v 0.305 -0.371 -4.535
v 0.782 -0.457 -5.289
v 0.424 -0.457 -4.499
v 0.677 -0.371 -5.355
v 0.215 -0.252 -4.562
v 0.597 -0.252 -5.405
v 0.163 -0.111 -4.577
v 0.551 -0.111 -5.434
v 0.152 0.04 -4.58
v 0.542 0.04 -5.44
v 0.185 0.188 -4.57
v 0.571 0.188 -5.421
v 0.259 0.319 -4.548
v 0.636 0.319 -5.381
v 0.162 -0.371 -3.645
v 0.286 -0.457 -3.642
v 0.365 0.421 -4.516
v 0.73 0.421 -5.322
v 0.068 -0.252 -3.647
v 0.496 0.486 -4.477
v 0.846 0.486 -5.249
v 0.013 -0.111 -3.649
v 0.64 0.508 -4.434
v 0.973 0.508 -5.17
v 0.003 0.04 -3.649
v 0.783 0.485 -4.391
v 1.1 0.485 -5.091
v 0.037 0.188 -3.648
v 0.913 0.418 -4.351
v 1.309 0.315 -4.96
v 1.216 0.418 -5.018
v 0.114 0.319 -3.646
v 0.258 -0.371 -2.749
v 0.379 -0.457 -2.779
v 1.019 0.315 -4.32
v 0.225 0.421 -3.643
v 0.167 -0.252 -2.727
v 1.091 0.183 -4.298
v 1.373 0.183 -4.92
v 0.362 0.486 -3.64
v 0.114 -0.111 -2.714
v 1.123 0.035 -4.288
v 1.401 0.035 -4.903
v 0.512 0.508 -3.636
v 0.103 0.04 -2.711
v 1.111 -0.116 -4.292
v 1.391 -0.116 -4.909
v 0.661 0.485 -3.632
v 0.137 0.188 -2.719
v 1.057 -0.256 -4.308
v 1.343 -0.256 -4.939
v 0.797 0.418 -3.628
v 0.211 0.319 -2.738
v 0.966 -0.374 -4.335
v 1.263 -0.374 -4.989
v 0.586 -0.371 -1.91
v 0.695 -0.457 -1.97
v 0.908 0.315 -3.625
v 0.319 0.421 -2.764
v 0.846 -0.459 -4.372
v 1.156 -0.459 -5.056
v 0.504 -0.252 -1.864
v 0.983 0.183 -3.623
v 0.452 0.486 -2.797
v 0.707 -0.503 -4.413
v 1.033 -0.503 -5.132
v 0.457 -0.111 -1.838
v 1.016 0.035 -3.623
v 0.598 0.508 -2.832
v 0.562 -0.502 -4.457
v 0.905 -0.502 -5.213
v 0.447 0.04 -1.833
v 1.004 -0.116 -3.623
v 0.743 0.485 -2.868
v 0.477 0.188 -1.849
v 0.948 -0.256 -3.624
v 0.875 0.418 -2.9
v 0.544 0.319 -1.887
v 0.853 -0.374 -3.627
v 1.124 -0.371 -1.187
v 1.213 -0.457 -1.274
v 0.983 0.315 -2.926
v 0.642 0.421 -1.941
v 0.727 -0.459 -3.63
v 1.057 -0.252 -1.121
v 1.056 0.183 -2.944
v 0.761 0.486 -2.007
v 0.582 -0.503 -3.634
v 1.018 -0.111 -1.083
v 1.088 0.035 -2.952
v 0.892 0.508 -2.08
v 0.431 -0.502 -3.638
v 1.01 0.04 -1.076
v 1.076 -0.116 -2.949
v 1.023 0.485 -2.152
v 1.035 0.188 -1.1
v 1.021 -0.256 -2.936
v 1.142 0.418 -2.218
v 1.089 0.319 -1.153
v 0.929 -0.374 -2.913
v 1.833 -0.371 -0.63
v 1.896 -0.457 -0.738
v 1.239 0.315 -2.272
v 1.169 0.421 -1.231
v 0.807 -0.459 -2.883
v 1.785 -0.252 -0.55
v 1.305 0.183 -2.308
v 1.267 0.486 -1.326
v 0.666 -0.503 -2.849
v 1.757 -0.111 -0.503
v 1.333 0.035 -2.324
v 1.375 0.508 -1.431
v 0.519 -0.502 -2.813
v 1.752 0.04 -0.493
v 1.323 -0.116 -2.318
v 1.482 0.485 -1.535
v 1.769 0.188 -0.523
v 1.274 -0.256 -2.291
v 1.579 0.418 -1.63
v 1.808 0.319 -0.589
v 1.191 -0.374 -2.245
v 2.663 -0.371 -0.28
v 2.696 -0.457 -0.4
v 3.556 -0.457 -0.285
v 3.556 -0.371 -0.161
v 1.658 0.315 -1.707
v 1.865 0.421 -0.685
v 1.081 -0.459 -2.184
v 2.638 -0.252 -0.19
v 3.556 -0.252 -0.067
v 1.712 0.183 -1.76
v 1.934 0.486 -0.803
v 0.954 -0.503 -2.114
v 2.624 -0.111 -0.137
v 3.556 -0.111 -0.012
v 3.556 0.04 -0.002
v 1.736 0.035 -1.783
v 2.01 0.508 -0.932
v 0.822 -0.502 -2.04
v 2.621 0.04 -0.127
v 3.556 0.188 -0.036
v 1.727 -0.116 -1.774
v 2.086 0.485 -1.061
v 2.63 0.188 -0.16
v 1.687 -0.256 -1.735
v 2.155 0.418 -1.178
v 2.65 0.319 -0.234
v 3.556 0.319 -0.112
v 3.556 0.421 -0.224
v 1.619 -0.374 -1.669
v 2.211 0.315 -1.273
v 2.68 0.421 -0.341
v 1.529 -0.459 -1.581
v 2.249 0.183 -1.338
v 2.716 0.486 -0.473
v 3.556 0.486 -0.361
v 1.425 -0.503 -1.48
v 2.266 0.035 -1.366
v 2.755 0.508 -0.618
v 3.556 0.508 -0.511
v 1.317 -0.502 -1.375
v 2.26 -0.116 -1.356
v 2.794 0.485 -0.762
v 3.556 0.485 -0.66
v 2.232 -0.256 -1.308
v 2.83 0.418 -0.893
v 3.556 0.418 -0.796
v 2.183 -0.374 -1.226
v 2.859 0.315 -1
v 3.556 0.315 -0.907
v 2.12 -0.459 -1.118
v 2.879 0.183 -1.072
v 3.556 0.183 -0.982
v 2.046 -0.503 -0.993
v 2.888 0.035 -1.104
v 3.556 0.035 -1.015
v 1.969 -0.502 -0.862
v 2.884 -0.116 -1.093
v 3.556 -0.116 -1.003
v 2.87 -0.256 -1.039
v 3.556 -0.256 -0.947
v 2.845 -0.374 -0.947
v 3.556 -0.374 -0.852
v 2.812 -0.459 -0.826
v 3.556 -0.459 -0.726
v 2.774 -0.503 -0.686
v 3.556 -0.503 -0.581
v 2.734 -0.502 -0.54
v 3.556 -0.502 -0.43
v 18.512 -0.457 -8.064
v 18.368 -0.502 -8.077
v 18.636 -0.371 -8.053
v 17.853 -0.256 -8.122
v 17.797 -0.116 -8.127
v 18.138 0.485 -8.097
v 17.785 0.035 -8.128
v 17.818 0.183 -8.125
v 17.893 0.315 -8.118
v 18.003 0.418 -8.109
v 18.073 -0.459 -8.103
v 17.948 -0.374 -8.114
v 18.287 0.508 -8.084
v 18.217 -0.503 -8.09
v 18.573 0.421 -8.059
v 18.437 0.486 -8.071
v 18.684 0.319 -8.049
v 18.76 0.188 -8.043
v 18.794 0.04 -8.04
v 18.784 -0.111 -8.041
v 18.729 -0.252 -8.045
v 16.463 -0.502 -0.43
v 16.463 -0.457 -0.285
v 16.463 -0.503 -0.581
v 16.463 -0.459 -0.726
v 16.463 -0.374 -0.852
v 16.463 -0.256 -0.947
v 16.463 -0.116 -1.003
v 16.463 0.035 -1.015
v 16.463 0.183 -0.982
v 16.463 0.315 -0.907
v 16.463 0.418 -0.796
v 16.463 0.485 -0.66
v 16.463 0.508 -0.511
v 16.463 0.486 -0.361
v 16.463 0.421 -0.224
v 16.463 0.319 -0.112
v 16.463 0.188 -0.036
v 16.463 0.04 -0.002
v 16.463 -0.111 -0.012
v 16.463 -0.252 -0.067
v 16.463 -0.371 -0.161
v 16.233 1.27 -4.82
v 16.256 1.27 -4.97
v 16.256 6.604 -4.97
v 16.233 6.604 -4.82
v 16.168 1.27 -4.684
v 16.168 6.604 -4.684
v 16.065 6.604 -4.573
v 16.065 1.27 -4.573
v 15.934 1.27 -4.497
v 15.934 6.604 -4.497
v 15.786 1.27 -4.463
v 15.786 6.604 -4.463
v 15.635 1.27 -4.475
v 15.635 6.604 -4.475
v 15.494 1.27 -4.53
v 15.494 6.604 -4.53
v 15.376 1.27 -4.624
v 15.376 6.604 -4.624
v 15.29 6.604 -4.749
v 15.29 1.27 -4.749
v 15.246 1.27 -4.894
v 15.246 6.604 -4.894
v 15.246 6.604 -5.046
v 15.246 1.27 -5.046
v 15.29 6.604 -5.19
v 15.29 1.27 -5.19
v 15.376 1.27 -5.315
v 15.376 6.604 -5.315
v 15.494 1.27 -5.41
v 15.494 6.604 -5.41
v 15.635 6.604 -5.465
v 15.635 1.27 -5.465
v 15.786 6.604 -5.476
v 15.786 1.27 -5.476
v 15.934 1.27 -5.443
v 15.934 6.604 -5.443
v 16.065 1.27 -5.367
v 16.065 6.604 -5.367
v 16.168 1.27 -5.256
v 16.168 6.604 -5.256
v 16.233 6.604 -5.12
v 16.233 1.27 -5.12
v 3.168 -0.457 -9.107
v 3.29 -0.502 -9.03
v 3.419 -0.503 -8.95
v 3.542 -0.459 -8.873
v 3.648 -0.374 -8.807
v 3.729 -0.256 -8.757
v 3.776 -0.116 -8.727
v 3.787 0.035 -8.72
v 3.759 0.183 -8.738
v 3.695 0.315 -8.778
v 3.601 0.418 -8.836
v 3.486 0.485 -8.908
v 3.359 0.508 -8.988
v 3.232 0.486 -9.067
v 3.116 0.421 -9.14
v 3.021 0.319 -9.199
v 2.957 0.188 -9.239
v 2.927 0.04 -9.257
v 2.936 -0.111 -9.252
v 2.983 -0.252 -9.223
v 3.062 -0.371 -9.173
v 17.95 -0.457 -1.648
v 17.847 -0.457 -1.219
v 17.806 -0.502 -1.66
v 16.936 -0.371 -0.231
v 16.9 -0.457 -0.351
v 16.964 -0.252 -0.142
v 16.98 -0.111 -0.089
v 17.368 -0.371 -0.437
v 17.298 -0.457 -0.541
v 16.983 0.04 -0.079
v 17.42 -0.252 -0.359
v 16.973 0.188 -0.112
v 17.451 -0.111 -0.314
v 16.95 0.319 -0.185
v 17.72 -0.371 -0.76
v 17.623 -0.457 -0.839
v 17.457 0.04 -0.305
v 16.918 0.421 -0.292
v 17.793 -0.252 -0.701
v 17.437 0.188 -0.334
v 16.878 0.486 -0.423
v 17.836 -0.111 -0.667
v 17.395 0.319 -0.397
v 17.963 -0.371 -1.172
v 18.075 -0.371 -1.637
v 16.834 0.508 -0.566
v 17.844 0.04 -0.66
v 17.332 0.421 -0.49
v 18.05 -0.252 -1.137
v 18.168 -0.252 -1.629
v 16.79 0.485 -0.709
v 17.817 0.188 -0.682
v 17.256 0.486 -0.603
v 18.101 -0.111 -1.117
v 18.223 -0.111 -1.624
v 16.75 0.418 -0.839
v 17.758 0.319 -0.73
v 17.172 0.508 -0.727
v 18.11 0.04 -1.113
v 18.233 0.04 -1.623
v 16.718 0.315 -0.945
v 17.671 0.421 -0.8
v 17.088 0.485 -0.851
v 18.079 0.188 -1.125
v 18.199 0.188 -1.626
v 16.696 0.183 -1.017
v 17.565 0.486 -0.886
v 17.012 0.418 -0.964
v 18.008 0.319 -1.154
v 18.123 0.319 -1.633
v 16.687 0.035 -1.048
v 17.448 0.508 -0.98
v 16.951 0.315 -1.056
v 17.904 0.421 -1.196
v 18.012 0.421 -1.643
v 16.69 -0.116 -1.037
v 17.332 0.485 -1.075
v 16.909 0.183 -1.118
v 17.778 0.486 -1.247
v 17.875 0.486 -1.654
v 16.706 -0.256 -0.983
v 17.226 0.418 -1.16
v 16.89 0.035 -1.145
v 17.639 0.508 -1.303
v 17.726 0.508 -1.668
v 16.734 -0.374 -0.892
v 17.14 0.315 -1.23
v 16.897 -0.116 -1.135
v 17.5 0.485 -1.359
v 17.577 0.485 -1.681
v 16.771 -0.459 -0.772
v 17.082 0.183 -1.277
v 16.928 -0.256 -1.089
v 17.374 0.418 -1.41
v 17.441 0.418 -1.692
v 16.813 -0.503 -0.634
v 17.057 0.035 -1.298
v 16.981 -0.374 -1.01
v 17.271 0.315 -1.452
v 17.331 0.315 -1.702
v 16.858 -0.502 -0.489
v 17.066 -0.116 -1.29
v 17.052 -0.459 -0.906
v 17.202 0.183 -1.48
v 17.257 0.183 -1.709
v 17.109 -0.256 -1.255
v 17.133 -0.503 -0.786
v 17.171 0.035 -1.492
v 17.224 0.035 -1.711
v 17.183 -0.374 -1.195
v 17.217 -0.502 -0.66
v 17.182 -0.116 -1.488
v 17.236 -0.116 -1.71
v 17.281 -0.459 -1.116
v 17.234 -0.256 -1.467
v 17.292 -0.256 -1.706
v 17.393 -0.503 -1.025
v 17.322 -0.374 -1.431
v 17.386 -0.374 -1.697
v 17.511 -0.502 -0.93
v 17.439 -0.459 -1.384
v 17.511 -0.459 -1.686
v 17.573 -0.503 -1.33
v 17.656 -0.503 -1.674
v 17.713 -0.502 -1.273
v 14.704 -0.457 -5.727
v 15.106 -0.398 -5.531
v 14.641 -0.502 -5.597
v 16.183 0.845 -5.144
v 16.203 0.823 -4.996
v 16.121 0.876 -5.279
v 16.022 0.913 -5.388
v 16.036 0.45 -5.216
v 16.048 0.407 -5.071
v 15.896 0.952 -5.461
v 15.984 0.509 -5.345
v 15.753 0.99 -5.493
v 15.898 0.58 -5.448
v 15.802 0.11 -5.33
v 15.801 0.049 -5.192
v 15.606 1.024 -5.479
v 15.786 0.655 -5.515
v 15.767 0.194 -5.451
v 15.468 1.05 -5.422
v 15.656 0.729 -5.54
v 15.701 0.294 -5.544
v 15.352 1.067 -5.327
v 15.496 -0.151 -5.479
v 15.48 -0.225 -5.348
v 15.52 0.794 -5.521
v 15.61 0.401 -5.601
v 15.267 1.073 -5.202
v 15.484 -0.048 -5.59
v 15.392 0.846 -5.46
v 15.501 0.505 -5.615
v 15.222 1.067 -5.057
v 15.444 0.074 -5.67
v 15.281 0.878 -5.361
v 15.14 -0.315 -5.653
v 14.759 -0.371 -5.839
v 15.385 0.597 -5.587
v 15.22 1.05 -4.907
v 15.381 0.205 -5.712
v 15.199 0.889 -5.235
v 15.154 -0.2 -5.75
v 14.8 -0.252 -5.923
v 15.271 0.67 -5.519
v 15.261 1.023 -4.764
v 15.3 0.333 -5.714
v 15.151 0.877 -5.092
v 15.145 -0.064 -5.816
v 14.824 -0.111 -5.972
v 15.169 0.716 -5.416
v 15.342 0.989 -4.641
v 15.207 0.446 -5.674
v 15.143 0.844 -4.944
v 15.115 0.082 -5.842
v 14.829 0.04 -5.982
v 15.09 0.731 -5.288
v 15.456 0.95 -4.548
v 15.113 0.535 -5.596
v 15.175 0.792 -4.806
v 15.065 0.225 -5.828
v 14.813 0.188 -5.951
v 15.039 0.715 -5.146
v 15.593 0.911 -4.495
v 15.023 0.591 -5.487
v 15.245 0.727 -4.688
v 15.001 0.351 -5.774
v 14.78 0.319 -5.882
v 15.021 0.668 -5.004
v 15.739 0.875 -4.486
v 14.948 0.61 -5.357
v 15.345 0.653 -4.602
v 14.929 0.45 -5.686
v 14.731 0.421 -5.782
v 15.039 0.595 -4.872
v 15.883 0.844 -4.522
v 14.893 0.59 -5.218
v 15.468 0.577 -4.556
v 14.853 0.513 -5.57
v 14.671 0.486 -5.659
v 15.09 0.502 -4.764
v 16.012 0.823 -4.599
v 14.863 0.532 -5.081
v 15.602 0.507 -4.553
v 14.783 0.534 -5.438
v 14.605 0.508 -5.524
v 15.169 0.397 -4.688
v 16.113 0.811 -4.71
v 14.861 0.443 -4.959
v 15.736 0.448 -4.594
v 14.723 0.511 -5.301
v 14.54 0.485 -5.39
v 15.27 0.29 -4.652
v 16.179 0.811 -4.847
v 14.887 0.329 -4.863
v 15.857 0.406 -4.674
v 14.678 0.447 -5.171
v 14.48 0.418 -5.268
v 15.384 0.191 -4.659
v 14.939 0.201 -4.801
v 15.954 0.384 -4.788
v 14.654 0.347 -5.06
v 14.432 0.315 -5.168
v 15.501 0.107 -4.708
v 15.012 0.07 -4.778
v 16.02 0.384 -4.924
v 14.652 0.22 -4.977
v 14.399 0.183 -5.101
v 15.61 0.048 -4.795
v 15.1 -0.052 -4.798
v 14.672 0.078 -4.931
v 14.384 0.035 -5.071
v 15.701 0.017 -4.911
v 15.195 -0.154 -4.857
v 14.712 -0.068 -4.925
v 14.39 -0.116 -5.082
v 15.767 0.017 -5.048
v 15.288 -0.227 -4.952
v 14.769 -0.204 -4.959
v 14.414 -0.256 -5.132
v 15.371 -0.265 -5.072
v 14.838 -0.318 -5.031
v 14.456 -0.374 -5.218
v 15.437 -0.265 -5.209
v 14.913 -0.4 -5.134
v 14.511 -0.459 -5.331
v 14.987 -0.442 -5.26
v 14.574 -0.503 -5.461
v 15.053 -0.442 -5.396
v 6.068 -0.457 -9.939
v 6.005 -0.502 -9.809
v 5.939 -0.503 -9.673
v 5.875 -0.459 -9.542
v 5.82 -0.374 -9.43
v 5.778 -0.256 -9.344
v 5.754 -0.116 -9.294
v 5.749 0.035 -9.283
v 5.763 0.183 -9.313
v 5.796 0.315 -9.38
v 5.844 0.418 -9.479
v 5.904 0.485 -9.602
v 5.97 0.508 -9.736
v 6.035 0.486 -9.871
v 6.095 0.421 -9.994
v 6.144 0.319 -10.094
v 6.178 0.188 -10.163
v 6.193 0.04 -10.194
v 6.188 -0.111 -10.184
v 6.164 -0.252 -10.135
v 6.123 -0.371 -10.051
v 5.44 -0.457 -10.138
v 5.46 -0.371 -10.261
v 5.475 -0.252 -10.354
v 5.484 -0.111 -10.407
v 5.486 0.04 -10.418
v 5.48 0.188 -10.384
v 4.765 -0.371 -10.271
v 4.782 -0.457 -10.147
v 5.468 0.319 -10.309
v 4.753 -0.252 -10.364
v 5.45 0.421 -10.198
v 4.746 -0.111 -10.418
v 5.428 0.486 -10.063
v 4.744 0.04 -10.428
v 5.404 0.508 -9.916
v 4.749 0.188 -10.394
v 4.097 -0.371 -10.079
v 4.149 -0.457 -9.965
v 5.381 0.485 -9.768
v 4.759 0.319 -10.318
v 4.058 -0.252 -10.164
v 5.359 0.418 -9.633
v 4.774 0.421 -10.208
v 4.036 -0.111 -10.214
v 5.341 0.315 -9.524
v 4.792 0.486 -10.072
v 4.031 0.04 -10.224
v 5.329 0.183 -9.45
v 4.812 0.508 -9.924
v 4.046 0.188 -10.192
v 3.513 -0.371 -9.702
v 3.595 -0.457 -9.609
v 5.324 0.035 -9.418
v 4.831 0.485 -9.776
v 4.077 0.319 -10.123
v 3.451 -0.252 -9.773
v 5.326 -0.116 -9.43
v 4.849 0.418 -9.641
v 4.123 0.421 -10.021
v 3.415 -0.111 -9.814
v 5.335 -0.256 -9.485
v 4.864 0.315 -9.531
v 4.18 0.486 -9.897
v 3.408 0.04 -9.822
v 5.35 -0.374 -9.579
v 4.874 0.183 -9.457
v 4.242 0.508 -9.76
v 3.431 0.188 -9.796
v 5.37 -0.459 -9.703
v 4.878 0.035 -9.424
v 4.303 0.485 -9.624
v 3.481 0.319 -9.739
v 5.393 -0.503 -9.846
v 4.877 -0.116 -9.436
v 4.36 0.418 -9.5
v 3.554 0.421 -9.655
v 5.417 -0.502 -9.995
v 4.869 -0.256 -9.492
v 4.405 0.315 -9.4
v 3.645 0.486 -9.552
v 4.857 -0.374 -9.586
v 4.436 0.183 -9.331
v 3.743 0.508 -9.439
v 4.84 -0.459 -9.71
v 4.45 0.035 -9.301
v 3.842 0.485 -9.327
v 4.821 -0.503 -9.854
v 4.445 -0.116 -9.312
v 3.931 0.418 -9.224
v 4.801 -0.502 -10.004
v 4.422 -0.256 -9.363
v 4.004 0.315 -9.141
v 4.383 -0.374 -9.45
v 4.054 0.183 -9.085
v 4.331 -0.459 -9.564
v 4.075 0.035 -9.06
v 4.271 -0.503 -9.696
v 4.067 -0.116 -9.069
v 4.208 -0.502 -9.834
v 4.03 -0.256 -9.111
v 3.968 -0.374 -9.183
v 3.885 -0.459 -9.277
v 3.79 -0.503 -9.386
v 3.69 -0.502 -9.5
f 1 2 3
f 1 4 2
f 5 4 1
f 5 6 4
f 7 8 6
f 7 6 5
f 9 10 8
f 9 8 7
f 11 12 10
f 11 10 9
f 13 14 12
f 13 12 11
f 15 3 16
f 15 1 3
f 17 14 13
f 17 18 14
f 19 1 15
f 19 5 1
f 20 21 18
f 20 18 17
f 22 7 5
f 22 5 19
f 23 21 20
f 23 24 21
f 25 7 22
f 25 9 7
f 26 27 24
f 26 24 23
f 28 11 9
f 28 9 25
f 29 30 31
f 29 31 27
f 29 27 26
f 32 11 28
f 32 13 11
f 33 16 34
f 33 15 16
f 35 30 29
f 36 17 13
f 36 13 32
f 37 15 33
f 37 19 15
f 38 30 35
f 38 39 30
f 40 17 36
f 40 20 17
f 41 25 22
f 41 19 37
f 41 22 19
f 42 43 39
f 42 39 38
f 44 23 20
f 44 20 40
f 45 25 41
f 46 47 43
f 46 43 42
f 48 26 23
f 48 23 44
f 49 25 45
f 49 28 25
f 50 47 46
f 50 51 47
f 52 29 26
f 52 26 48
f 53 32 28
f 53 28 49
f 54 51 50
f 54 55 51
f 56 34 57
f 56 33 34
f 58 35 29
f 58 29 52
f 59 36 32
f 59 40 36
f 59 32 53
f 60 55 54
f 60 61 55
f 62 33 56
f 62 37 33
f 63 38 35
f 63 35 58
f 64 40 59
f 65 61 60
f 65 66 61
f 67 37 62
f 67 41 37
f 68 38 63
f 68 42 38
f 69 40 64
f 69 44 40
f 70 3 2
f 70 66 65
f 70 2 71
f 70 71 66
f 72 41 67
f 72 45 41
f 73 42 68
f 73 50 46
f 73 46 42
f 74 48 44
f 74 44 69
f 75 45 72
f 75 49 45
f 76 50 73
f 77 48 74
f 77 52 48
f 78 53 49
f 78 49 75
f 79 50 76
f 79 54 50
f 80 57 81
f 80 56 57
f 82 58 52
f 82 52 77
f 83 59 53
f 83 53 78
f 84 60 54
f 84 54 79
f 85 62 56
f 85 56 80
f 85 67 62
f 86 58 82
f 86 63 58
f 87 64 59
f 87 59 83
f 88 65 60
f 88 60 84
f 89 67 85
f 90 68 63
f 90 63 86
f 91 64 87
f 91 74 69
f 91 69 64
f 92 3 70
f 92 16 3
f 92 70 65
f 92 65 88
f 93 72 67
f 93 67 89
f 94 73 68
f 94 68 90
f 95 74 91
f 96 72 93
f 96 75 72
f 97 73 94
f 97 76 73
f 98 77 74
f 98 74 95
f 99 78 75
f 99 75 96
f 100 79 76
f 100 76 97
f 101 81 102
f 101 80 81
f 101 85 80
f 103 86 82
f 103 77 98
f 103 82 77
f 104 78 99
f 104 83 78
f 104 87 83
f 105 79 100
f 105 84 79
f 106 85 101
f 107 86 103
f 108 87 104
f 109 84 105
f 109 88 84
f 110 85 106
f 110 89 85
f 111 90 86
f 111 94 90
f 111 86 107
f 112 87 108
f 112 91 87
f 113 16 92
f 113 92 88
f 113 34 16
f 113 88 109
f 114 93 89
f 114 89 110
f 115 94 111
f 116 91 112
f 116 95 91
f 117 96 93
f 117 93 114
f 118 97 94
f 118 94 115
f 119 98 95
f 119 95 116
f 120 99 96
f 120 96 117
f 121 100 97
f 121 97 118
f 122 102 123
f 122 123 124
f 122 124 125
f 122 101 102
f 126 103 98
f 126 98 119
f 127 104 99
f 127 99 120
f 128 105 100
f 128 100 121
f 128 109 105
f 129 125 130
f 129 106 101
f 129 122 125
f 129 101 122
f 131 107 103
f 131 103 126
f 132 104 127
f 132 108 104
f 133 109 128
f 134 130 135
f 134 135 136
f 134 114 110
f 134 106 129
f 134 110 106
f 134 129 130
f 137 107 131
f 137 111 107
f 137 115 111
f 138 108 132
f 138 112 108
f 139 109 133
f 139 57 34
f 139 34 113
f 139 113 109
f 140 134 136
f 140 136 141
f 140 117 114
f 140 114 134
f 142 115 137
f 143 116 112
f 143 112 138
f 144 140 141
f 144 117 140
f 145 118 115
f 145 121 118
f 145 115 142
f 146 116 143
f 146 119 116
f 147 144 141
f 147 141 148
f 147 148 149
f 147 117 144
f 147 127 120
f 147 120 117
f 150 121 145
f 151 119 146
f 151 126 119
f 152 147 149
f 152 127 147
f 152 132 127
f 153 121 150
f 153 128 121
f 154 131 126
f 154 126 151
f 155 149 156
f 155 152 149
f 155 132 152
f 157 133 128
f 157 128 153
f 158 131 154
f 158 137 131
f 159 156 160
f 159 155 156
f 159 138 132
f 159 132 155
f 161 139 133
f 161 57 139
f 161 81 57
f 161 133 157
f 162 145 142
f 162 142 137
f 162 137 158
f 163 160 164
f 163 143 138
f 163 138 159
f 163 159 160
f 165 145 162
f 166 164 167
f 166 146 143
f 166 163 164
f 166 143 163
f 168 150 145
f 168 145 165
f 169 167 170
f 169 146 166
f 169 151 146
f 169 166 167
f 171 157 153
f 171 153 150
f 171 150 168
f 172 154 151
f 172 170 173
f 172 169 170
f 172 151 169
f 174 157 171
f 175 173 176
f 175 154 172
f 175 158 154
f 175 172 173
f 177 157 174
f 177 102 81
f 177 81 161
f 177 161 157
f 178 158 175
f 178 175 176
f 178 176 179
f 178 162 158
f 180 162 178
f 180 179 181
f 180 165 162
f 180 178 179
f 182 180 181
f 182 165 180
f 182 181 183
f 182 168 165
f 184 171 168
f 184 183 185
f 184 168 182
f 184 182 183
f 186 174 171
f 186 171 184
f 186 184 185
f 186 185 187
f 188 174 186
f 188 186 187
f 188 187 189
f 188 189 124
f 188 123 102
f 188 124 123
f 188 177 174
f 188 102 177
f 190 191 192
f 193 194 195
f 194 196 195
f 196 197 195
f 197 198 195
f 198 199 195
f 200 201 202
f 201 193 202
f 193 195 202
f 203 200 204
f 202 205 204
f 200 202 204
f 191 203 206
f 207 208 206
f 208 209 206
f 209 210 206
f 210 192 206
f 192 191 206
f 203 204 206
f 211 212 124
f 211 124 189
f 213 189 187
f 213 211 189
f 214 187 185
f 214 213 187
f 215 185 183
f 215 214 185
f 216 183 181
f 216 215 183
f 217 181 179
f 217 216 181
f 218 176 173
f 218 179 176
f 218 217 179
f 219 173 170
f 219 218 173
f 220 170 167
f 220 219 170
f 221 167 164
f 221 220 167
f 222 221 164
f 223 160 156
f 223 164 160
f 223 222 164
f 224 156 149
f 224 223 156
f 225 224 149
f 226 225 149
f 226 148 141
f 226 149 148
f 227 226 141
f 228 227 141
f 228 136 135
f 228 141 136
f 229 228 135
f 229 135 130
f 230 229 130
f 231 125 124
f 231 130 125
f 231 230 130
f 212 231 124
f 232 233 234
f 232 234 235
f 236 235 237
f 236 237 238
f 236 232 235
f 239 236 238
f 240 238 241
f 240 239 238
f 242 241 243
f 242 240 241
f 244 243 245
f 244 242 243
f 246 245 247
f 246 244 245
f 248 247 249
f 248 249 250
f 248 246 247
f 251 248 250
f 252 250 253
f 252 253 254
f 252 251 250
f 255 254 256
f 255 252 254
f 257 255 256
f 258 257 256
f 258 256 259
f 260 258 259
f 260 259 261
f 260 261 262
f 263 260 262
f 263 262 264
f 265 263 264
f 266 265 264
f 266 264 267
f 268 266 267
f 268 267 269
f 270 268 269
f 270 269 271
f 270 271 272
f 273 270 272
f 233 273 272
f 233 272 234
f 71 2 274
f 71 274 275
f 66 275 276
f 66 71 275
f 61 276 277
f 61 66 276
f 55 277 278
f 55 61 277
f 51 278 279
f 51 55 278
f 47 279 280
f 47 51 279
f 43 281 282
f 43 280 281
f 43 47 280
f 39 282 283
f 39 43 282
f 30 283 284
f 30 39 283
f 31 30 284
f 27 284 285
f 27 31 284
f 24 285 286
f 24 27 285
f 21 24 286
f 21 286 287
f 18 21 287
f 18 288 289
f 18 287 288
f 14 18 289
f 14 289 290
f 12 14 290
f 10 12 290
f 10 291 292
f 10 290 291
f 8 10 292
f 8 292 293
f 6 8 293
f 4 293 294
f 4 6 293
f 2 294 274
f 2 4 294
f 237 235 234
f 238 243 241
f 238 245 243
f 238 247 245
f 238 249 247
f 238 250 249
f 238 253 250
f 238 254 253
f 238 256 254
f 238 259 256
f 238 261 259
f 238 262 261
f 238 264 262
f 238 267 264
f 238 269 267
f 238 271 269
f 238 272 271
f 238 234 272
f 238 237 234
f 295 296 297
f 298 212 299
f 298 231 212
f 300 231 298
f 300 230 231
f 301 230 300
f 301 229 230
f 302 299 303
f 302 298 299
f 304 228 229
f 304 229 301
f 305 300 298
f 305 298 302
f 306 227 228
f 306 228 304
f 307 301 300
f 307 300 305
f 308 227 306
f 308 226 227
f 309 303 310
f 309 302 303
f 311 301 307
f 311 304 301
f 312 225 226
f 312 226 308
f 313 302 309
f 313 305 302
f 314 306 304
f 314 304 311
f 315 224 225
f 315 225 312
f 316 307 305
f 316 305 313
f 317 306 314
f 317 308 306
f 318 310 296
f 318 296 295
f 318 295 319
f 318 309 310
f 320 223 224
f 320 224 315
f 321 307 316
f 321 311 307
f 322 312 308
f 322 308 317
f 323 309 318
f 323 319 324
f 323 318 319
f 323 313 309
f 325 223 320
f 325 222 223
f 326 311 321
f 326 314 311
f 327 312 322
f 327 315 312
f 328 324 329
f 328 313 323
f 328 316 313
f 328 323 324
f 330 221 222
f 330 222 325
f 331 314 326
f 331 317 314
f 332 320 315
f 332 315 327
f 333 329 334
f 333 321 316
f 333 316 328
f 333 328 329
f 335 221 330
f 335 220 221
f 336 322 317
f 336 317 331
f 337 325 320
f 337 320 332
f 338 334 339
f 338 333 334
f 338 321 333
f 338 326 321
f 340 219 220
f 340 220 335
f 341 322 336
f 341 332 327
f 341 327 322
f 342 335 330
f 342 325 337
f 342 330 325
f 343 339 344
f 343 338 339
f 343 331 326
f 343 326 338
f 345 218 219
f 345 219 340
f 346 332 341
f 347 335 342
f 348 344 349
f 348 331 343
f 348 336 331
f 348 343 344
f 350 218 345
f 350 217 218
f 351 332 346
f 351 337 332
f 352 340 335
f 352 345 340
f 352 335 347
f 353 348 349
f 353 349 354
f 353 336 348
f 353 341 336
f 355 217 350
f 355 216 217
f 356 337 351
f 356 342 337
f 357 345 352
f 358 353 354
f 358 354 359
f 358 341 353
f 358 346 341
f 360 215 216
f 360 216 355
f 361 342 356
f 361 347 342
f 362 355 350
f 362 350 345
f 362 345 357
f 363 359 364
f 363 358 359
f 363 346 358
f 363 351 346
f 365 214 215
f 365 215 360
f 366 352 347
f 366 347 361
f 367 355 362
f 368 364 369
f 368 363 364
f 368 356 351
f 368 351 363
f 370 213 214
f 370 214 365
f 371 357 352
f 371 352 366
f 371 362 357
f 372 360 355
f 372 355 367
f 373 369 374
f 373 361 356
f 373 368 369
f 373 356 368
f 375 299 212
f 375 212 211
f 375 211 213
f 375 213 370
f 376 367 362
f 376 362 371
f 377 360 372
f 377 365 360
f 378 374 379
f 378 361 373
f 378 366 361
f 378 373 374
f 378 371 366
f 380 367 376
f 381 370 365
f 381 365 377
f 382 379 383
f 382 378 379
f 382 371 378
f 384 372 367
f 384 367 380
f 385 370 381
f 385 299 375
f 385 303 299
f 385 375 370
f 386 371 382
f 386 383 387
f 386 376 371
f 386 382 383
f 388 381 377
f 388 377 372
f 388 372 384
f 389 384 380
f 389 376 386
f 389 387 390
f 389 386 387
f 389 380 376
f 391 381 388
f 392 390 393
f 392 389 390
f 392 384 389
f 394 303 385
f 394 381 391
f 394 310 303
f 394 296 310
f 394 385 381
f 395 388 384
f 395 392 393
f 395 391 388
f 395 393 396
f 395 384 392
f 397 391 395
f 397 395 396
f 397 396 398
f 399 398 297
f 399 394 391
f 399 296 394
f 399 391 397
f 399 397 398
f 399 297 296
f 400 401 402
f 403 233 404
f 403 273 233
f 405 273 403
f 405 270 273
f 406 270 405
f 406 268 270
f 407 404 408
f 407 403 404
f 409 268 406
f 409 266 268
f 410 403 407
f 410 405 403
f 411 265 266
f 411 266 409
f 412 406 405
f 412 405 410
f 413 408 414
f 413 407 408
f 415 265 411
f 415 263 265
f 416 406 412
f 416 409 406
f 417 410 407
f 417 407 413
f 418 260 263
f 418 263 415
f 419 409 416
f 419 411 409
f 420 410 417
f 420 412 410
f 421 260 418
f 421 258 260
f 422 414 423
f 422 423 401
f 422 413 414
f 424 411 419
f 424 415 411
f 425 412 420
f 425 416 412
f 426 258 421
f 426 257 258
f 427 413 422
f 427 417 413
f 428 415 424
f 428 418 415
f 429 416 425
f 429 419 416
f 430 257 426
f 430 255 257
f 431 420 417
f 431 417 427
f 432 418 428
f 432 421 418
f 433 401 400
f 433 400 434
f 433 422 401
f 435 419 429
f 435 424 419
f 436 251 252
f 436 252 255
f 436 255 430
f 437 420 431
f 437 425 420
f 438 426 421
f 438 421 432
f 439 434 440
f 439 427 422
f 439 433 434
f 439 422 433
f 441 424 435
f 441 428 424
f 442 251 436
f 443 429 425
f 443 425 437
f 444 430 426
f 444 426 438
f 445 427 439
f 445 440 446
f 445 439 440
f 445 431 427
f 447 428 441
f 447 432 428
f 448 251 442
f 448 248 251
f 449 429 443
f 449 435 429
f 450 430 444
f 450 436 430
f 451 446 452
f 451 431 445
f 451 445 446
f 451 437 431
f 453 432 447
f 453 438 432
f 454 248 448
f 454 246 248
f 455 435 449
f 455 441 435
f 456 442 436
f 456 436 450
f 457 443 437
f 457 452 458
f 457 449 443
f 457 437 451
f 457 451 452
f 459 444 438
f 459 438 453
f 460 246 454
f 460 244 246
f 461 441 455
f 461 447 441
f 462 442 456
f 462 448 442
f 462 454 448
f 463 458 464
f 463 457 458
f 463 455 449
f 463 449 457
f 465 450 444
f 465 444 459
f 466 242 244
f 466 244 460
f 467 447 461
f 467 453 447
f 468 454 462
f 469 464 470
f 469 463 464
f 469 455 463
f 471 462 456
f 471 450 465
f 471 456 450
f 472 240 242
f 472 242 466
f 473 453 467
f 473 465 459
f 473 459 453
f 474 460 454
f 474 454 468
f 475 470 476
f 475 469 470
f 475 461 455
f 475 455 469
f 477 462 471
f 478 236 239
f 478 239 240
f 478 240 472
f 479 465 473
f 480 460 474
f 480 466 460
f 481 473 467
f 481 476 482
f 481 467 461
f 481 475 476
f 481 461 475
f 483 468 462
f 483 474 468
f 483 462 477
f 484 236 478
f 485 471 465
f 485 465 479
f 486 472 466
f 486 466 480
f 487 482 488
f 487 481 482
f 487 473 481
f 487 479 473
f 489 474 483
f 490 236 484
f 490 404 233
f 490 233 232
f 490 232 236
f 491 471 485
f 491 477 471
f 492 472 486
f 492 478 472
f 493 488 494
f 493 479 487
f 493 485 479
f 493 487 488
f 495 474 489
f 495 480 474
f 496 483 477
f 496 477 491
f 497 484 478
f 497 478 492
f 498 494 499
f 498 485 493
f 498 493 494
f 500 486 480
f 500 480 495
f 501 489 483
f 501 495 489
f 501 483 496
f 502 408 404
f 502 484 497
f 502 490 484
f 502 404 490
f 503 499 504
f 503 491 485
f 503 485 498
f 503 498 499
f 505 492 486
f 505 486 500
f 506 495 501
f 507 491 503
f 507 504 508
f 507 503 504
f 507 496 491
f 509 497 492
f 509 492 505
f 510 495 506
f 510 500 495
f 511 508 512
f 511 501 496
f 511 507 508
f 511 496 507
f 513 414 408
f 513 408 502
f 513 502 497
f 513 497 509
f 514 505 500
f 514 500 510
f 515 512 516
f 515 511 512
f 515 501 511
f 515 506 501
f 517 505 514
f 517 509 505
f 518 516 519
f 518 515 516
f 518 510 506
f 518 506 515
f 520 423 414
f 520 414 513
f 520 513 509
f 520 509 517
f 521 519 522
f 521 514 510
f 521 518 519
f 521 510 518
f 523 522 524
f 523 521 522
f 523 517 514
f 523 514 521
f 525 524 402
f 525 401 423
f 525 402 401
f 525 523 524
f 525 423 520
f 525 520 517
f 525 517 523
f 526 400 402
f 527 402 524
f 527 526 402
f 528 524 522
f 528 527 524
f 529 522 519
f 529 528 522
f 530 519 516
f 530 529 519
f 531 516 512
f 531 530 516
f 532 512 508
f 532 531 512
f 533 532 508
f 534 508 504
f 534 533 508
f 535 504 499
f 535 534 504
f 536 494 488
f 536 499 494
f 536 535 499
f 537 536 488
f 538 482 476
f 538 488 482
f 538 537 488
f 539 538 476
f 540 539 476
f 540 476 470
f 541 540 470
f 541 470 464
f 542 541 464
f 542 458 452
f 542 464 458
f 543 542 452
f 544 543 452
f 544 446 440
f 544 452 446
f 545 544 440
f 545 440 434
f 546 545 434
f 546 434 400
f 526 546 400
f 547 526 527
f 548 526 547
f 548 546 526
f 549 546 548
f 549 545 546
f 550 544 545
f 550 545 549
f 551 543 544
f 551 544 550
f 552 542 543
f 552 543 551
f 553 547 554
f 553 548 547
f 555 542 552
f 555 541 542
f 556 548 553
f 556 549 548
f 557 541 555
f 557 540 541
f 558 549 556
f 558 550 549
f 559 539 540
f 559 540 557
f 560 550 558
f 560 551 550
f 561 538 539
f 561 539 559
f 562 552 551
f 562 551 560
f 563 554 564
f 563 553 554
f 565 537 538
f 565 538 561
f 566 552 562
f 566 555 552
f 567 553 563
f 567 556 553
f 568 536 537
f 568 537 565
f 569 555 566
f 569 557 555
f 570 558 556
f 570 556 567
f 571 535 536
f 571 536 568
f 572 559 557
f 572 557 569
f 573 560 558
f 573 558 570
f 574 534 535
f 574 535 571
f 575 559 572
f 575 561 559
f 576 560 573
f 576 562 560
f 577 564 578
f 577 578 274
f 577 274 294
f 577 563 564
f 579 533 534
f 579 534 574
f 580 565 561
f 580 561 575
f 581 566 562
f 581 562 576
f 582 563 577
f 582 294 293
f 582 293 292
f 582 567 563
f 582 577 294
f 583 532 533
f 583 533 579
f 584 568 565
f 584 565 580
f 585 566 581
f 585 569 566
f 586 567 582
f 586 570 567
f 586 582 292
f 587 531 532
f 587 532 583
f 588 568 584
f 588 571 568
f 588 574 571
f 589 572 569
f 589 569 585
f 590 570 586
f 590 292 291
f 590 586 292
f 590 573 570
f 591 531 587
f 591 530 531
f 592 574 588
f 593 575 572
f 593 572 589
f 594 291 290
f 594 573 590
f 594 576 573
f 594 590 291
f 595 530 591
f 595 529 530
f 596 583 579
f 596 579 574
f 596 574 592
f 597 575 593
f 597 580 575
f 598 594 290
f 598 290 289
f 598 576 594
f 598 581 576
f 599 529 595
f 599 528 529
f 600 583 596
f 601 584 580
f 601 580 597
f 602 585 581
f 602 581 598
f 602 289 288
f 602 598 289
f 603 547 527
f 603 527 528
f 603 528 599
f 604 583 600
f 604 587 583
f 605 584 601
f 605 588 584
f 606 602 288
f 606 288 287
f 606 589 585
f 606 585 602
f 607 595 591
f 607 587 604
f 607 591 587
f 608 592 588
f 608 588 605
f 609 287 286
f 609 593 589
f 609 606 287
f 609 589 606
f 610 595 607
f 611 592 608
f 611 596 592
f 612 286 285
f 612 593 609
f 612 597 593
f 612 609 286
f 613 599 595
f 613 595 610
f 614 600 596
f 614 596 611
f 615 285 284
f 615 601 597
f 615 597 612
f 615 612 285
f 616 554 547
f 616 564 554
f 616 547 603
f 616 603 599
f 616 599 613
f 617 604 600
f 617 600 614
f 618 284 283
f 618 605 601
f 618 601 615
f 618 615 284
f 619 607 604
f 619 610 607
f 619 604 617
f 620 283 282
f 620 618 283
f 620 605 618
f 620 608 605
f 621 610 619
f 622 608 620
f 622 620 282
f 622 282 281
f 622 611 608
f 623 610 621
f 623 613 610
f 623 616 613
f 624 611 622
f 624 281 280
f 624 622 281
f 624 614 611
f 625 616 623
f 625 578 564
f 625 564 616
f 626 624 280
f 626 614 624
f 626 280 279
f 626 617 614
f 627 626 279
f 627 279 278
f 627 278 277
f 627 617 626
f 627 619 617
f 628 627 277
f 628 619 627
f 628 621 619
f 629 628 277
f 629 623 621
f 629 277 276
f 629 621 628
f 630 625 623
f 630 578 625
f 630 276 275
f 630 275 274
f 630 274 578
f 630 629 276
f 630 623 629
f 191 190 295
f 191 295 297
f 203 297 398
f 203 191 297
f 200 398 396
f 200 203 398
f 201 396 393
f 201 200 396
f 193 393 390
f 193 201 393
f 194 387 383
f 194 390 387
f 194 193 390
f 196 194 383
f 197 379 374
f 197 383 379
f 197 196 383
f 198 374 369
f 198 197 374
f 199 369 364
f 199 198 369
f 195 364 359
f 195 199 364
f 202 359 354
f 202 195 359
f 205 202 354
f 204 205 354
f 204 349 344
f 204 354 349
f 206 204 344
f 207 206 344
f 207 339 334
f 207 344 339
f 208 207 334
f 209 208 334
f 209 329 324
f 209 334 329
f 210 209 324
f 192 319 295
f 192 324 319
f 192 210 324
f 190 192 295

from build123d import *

# Parameters (mm, degrees)
SKETCH4_R = 0.508


with BuildPart() as part:
    # Sweep1: sweep along a curve in space
    with BuildLine() as sweep1_path:
        Line((15.748, 6.604, -4.969858904), (15.748, 1.27, -4.969858904))
        ThreePointArc((15.748, 1.27, -4.969858904), (15.413671635, 0.371974388, -5.132921743), (14.606531561, 0, -5.52659026))
        Line((14.606531561, 0, -5.52659026), (5.97077017, 0, -9.738532518))
        ThreePointArc((5.97077017, 0, -9.738532518), (4.519904893, 0, -9.865466782), (3.356766269, 0, -8.988978961))
        Line((3.356766269, 0, -8.988978961), (0.971149403, 0, -5.171193917))
        ThreePointArc((0.971149403, 0, -5.171193917), (0.890159133, 0, -2.078300277), (3.556, 0, -0.508))
        Line((3.556, 0, -0.508), (16.463402457, 0, -0.508))
        ThreePointArc((16.463402457, 0, -0.508), (17.321402021, 0, -0.841657782), (17.728569724, 0, -1.667312207))
        Line((17.728569724, 0, -1.667312207), (18.289933093, 0, -8.083724883))
    # Sketch4 → Sweep1 (sweep)
    with BuildSketch(Plane(origin=(0, 6.604, 0), x_dir=(1, 0, 0), z_dir=(0, 1, 0))):
        with Locations((15.748, 4.969858904)):
            Circle(SKETCH4_R)
    sweep(path=sweep1_path.line)


solid = part.part
